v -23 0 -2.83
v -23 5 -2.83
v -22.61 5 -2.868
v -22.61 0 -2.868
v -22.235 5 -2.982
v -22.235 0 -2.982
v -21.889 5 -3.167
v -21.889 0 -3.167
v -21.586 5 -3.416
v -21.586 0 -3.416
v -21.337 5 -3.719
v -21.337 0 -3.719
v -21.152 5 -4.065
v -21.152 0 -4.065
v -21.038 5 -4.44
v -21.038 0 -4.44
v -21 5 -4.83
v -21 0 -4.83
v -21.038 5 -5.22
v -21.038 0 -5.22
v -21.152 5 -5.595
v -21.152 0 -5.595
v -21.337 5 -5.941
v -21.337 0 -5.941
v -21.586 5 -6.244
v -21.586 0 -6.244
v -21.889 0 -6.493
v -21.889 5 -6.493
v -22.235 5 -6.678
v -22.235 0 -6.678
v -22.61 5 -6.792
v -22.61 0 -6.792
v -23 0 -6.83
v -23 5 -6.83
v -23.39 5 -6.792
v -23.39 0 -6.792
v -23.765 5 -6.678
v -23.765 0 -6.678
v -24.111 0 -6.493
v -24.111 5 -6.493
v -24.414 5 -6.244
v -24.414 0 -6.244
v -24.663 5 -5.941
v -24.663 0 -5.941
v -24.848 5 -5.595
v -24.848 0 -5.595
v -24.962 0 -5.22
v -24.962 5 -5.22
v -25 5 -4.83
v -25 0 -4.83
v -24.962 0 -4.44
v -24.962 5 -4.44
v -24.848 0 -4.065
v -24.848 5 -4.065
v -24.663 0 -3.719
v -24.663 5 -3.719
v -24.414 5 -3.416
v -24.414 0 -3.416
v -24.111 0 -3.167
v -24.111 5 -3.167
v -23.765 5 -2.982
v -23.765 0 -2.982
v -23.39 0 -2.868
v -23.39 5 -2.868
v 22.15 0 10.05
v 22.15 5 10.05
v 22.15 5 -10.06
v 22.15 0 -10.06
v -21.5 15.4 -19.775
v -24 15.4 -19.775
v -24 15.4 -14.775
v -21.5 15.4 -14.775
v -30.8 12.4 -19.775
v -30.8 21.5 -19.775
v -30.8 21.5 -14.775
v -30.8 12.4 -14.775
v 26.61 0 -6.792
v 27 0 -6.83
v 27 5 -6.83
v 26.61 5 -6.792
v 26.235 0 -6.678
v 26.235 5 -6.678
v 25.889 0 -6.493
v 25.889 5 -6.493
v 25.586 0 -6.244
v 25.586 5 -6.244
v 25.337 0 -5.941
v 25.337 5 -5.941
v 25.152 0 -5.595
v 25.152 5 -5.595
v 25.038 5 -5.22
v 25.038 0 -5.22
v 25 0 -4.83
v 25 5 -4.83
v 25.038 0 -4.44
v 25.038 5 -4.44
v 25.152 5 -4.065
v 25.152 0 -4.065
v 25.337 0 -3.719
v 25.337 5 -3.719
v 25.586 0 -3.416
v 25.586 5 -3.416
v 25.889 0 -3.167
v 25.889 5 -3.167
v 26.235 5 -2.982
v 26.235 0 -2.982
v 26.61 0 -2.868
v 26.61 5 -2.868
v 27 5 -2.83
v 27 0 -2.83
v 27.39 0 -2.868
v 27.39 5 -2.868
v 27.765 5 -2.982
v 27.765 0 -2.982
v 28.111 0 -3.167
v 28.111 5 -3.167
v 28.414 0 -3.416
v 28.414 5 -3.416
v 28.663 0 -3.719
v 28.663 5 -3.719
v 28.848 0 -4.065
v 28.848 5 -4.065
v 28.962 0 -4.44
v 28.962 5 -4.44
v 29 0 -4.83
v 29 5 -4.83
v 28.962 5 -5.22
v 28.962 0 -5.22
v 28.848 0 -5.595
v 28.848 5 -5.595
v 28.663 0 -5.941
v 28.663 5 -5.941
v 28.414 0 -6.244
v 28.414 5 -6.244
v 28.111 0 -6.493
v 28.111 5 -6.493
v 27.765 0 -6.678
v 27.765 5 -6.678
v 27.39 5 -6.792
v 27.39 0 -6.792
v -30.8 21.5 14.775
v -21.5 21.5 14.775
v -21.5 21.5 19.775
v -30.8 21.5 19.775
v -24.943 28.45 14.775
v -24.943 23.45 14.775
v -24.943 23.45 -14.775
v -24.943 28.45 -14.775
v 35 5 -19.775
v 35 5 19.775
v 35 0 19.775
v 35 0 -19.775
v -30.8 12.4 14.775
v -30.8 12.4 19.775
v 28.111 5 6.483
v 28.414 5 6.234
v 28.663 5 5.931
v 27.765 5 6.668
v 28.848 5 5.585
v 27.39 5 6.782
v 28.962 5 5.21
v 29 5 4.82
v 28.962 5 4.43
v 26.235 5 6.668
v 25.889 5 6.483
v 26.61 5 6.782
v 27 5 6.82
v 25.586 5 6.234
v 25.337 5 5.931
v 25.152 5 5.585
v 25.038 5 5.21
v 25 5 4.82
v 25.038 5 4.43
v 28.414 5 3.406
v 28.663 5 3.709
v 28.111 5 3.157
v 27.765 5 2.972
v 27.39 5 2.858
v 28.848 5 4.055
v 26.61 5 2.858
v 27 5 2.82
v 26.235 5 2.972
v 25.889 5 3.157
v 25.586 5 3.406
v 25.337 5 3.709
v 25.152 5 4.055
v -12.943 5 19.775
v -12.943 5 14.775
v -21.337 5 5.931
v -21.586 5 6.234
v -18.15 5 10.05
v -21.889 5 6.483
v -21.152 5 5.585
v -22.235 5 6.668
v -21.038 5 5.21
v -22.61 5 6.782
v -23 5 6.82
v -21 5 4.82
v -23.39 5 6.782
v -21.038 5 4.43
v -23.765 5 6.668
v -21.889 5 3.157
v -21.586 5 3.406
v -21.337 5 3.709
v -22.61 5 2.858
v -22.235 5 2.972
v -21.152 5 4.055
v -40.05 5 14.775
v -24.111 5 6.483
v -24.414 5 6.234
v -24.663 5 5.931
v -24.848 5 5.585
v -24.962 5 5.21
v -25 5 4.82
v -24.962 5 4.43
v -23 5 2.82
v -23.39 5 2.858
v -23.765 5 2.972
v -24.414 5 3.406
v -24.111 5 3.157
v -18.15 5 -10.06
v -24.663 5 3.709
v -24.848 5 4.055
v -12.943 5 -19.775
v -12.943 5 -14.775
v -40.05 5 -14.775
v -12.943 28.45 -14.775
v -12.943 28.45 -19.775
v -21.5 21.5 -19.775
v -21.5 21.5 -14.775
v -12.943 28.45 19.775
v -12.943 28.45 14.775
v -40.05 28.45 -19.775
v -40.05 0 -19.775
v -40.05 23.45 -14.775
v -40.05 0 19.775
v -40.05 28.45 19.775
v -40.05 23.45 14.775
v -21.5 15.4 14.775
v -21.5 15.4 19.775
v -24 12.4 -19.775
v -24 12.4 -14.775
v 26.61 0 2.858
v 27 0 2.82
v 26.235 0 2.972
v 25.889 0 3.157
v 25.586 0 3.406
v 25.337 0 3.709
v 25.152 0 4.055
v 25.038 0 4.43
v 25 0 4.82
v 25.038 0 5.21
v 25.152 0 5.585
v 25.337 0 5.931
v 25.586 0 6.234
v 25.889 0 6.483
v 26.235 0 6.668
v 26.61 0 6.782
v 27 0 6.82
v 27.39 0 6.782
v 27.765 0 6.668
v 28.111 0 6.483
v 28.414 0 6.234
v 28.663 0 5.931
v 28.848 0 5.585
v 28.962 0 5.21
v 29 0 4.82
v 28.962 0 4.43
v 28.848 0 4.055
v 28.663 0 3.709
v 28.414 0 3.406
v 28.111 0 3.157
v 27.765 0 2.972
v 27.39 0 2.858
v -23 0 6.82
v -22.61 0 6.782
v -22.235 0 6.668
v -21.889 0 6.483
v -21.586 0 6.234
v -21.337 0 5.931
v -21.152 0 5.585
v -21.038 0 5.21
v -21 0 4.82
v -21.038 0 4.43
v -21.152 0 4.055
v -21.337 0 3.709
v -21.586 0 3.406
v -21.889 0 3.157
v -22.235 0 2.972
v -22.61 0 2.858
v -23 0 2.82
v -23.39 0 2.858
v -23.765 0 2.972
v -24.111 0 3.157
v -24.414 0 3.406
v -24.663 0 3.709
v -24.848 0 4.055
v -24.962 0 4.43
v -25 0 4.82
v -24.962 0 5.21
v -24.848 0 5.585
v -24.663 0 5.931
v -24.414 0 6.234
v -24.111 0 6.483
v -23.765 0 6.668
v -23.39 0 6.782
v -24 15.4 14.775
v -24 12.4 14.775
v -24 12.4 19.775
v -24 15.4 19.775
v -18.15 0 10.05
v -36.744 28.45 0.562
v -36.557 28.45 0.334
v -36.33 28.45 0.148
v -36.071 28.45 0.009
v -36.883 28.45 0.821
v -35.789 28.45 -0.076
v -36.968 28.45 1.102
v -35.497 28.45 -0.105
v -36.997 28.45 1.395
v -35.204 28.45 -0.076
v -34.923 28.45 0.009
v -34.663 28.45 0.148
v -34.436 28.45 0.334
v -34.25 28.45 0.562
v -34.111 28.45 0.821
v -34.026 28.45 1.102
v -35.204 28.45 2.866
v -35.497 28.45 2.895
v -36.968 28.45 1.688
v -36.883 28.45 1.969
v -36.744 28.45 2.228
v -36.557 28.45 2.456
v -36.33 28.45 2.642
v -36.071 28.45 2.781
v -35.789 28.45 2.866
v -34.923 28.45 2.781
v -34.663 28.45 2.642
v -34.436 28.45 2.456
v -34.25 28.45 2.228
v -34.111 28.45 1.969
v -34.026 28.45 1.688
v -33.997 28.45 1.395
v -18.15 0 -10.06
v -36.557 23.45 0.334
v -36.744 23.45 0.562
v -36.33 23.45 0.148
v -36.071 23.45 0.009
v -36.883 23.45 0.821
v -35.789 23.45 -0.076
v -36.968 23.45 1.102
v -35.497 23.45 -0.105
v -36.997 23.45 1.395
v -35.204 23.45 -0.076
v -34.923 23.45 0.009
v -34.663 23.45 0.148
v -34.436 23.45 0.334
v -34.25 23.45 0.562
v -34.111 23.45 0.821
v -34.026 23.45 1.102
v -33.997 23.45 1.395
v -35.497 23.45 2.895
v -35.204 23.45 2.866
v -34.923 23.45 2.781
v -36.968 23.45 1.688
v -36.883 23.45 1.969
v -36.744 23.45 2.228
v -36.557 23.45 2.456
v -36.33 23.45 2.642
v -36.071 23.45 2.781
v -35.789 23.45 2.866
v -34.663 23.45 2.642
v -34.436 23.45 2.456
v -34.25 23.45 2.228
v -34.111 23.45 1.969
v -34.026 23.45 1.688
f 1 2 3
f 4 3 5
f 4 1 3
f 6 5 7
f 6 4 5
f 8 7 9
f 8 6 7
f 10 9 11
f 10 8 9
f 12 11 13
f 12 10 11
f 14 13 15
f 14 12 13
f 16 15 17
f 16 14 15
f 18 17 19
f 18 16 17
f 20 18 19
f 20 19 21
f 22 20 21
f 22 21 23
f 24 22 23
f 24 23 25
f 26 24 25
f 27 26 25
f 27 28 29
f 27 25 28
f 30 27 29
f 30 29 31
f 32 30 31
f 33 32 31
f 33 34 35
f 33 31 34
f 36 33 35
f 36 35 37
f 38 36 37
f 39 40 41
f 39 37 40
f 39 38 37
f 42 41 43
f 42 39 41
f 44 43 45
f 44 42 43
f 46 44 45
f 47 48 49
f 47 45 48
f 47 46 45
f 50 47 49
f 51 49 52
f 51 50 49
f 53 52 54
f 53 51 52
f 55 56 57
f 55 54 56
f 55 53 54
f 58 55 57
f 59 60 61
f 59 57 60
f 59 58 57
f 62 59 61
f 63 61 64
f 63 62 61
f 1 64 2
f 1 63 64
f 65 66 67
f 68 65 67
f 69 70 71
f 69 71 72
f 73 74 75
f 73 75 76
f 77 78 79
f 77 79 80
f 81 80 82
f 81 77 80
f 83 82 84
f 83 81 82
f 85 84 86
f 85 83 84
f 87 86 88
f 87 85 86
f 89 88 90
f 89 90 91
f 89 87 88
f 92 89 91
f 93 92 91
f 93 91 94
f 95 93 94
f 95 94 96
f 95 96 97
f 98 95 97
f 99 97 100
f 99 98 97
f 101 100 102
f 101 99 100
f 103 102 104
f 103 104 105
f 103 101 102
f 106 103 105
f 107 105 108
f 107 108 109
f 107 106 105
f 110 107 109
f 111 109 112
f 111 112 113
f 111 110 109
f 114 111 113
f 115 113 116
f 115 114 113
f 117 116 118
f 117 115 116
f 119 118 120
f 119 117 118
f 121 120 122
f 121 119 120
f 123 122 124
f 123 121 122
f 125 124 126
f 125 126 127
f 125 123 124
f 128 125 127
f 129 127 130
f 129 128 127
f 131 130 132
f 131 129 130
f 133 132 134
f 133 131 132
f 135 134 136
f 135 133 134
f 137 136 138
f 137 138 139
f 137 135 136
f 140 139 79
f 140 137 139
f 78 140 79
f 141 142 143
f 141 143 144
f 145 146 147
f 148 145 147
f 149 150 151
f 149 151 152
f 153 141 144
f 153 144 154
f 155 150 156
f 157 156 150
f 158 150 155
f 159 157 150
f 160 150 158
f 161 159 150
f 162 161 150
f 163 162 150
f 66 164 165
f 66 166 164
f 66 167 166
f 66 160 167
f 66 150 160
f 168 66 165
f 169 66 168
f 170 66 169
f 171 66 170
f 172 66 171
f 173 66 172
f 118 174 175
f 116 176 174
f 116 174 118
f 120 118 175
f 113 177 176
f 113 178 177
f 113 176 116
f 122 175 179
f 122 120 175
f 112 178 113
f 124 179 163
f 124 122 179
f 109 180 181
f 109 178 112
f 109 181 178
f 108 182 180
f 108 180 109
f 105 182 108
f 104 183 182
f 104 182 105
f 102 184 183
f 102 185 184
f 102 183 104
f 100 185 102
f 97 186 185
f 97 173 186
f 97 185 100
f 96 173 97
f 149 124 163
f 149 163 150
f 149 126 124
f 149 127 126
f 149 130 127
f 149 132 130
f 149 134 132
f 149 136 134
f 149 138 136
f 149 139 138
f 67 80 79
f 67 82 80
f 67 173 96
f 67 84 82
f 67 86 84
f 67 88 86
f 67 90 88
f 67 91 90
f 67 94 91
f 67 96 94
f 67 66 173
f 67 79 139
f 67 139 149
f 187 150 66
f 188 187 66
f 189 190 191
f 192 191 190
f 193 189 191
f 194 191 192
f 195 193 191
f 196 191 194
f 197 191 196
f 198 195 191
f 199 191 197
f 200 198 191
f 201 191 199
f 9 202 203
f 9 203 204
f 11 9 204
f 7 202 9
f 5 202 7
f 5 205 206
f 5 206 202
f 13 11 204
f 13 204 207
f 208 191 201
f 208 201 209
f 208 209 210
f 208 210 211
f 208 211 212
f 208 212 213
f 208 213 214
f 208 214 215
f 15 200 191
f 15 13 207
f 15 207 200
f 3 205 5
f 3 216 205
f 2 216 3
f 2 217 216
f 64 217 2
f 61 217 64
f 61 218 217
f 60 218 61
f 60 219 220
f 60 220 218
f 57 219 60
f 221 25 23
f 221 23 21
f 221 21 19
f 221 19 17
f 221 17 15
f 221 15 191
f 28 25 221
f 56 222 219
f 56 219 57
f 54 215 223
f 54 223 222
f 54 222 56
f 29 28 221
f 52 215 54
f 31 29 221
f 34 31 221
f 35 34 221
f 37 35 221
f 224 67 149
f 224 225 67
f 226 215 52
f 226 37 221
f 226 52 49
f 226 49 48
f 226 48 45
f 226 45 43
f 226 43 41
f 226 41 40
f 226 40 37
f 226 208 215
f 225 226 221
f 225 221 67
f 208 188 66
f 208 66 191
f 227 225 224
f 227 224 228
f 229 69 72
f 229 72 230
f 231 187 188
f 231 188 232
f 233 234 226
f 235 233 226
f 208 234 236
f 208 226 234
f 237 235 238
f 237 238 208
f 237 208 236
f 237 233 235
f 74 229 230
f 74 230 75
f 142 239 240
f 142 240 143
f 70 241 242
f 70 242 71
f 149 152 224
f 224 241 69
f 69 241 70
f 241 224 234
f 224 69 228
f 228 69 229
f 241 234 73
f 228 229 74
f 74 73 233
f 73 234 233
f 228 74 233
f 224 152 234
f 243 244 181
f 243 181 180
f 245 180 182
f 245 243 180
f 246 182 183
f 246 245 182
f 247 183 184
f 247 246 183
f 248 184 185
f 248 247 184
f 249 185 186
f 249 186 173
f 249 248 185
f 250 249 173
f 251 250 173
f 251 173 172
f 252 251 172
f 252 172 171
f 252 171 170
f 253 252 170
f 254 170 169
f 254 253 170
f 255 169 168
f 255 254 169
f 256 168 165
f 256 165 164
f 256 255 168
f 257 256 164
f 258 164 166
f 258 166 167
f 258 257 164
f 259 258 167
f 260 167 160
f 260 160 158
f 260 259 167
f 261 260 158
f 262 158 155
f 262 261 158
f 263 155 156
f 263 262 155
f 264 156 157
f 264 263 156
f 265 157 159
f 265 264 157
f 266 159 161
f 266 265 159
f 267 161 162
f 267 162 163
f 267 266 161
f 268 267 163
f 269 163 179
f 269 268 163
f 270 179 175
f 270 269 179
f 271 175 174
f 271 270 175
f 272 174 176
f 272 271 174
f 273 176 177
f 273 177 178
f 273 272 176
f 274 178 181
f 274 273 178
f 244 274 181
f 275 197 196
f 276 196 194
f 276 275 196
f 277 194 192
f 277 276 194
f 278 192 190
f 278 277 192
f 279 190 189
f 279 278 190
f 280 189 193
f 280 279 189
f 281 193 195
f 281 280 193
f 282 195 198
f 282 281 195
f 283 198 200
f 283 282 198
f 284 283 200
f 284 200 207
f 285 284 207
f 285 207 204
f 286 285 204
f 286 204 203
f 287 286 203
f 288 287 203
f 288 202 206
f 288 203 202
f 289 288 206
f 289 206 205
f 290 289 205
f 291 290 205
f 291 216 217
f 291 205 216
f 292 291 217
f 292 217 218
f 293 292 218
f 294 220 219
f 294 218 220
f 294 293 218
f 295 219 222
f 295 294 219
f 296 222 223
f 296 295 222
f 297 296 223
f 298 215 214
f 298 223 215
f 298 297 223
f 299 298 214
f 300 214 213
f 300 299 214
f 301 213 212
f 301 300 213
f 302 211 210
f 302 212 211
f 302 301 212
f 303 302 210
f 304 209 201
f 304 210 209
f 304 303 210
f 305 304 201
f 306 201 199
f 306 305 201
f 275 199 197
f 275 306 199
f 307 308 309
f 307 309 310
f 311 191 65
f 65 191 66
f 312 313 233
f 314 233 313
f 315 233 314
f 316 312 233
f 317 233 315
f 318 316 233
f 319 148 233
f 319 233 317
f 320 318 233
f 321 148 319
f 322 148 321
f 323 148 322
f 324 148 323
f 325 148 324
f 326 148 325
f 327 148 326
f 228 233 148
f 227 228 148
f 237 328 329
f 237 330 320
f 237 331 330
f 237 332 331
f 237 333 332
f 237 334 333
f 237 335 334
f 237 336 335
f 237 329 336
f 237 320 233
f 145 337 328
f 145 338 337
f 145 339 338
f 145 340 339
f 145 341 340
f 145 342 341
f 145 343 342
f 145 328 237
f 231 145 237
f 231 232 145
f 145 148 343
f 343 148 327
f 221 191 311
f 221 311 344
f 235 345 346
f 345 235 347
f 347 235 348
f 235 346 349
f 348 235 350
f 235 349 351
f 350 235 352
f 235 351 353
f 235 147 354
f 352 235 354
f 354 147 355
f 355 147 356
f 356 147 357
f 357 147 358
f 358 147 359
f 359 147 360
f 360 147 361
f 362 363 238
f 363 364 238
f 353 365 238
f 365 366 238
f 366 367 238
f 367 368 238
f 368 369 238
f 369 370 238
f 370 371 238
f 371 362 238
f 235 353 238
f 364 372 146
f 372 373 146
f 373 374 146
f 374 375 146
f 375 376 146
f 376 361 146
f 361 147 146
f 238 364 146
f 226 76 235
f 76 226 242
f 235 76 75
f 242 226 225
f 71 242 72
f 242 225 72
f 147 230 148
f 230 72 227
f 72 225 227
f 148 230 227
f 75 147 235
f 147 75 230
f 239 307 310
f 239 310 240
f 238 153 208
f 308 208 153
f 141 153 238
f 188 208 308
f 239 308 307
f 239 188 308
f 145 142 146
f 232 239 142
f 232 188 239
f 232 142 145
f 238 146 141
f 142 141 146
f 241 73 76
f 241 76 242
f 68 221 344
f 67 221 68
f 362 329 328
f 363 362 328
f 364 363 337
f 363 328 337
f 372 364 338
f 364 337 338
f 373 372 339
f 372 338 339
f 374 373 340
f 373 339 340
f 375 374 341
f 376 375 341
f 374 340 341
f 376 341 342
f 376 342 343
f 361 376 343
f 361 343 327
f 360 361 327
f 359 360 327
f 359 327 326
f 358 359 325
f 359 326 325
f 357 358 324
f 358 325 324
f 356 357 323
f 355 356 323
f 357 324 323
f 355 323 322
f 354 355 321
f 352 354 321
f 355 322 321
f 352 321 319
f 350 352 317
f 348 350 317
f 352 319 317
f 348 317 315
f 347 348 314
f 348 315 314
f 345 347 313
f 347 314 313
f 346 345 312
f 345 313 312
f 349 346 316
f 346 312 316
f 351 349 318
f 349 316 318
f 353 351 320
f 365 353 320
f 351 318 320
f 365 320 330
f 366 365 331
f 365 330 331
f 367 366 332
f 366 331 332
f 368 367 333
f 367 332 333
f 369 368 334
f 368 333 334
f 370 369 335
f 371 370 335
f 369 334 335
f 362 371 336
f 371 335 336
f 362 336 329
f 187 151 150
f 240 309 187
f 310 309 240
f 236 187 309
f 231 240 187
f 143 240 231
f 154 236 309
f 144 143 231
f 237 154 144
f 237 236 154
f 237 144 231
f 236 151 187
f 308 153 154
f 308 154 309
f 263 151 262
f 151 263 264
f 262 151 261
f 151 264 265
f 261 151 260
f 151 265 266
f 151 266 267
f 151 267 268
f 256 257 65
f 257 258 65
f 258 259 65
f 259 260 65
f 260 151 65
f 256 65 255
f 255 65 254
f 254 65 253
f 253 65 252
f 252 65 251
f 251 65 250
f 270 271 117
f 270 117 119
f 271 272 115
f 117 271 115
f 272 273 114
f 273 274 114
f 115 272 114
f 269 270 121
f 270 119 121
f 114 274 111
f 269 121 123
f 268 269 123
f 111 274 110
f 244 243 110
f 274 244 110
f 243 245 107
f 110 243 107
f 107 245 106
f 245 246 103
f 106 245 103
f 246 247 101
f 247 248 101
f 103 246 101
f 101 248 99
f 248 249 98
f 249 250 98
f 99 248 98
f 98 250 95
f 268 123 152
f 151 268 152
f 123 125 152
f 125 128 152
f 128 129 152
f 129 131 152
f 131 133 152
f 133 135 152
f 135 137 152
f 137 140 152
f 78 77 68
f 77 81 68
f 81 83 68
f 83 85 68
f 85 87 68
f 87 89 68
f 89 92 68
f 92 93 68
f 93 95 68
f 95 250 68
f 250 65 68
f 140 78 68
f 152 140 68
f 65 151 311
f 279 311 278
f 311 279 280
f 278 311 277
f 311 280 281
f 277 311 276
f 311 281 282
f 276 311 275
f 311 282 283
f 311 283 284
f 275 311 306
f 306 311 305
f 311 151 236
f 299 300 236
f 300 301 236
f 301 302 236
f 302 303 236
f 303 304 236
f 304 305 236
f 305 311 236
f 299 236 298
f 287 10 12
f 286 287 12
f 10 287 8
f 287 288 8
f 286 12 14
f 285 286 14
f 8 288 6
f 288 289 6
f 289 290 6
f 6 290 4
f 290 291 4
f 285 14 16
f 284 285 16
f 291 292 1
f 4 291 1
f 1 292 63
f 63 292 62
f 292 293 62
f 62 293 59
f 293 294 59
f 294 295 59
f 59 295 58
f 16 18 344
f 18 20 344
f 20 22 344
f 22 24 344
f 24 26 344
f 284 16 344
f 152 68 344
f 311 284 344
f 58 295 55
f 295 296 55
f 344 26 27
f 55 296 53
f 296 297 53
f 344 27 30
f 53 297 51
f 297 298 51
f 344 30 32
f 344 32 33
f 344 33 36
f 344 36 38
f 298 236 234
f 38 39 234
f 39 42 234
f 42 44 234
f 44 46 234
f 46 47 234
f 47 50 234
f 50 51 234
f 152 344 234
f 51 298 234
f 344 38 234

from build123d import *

# Parameters (mm, degrees)
SKETCH1_R           = 2
SKETCH1_W           = 40
SKETCH1_H           = 19.81
BOSS_EXTRUDE1_DEPTH = 5
SKETCH2_W           = 23.106523906
SKETCH2_H           = 5
BOSS_EXTRUDE2_DEPTH = 18.45
SKETCH3_W           = 23.106523906
SKETCH3_H           = 5
BOSS_EXTRUDE3_DEPTH = 39.55
CUT_EXTRUDE1_START  = -39.55
CUT_EXTRUDE1_DEPTH  = 39.55
SKETCH6_W           = 12
SKETCH6_H           = 29.55
CUT_EXTRUDE2_DEPTH  = 23.45
CUT_EXTRUDE3_START  = -39.55
CUT_EXTRUDE3_DEPTH  = 39.55
SKETCH9_W           = 39.55
SKETCH9_H           = 28.45
SKETCH9_W_2         = 29.55
SKETCH9_H_2         = 18.45
BOSS_EXTRUDE4_DEPTH = 4
SKETCH11_W          = 39.55
SKETCH11_H          = 5
BOSS_EXTRUDE5_DEPTH = 3
SKETCH12_W          = 40.3
SKETCH12_H          = 20.11
SKETCH12_W_2        = 40
SKETCH12_H_2        = 19.81
CUT_EXTRUDE4_DEPTH  = 5
SKETCH13_R          = 1.5
CUT_EXTRUDE5_DEPTH  = 5


with BuildPart() as part:
    # Sketch1 → Boss-Extrude1 (new body)
    with BuildSketch(Plane(origin=(0, 0, 0), x_dir=(1, 0, 0), z_dir=(0, 1, 0))):
        Polygon((32, -9.9), (32, 10.1), (32, 18.775), (32, 19.775), (31, 19.775), (-13.05, 19.775), (-27, 19.775), (-36.05, 19.775), (-36.05, -19.775), (-27, -19.775), (-13.05, -19.775), (31, -19.775), (32, -19.775), (32, -18.775), align=None)
        with Locations(Location((-23, -4.82, 0), (0, 0, 270))):
            Circle(SKETCH1_R, mode=Mode.SUBTRACT)
        with Locations(Location((-23, 4.83, 0), (0, 0, 270))):
            Circle(SKETCH1_R, mode=Mode.SUBTRACT)
        with Locations(Location((27, -4.82, 0), (0, 0, 90))):
            Circle(SKETCH1_R, mode=Mode.SUBTRACT)
        with Locations(Location((27, 4.83, 0), (0, 0, 90))):
            Circle(SKETCH1_R, mode=Mode.SUBTRACT)
        with Locations((2, 0.005)):
            Rectangle(SKETCH1_W, SKETCH1_H, mode=Mode.SUBTRACT)
    extrude(amount=BOSS_EXTRUDE1_DEPTH)

    # Sketch2 → Boss-Extrude2 (add)
    with BuildSketch(Plane(origin=(0, 5, 0), x_dir=(1, 0, 0), z_dir=(0, 1, 0))):
        with Locations((-24.496738047, -17.275)):
            Rectangle(SKETCH2_W, SKETCH2_H)
        with Locations((-24.496738047, 17.275)):
            Rectangle(SKETCH2_W, SKETCH2_H)
    extrude(amount=BOSS_EXTRUDE2_DEPTH)

    # Sketch3 → Boss-Extrude3 (add)
    with BuildSketch(Plane.XY.offset(19.775)):
        with Locations((-24.496738047, 25.95)):
            Rectangle(SKETCH3_W, SKETCH3_H)
    extrude(amount=-BOSS_EXTRUDE3_DEPTH)

    # Sketch4 → Cut-Extrude1 (cut)
    with BuildSketch(Plane.XY.offset(19.775).offset(CUT_EXTRUDE1_START)):
        Polygon((-24.05, 21.45), (-30.75, 21.45), (-30.75, 15.45), (-30.75, 12.45), (-24.05, 12.45), (-24.05, 15.45), (-21.55, 15.45), (-21.55, 21.45), align=None)
    extrude(amount=CUT_EXTRUDE1_DEPTH, mode=Mode.SUBTRACT)

    # Sketch6 → Cut-Extrude2 (cut)
    with BuildSketch(Plane(origin=(0, 5, 0), x_dir=(1, 0, 0), z_dir=(0, 1, 0))):
        with Locations((-18.943476094, 0)):
            Rectangle(SKETCH6_W, SKETCH6_H)
    extrude(amount=CUT_EXTRUDE2_DEPTH, mode=Mode.SUBTRACT)

    # Sketch7 → Cut-Extrude3 (cut)
    with BuildSketch(Plane.XY.offset(19.775).offset(CUT_EXTRUDE3_START)):
        Polygon((-24.05, 21.5), (-30.8, 21.5), (-30.8, 15.45), (-30.8, 12.4), (-24, 12.4), (-24, 15.4), (-21.5, 15.4), (-21.5, 21.5), align=None)
        Polygon((-24.05, 21.45), (-30.75, 21.45), (-30.75, 15.45), (-30.75, 12.45), (-24.05, 12.45), (-24.05, 15.45), (-21.55, 15.45), (-21.55, 21.45), align=None, mode=Mode.SUBTRACT)
    extrude(amount=CUT_EXTRUDE3_DEPTH, mode=Mode.SUBTRACT)

    # Sketch9 → Boss-Extrude4 (add)
    with BuildSketch(Plane.ZY.offset(36.05)):
        with Locations((0, 14.225)):
            Rectangle(SKETCH9_W, SKETCH9_H)
        with Locations((0, 14.225)):
            Rectangle(SKETCH9_W_2, SKETCH9_H_2, mode=Mode.SUBTRACT)
    extrude(amount=BOSS_EXTRUDE4_DEPTH)

    # Sketch11 → Boss-Extrude5 (add)
    with BuildSketch(Plane(origin=(32, 0, 0), x_dir=(0, 0, -1), z_dir=(1, 0, 0))):
        with Locations((0, 2.5)):
            Rectangle(SKETCH11_W, SKETCH11_H)
    extrude(amount=BOSS_EXTRUDE5_DEPTH)

    # Sketch12 → Cut-Extrude4 (cut)
    with BuildSketch(Plane(origin=(0, 5, 0), x_dir=(1, 0, 0), z_dir=(0, 1, 0))):
        with Locations((2, 0.005)):
            Rectangle(SKETCH12_W, SKETCH12_H)
        with Locations((2, 0.005)):
            Rectangle(SKETCH12_W_2, SKETCH12_H_2, mode=Mode.SUBTRACT)
    extrude(amount=-CUT_EXTRUDE4_DEPTH, mode=Mode.SUBTRACT)

    # Sketch13 → Cut-Extrude5 (cut)
    with BuildSketch(Plane(origin=(0, 28.45, 0), x_dir=(1, 0, 0), z_dir=(0, 1, 0))):
        with Locations(Location((-35.49673805, -1.395, 0), (0, 0, 270))):
            Circle(SKETCH13_R)
    extrude(amount=-CUT_EXTRUDE5_DEPTH, mode=Mode.SUBTRACT)


solid = part.part
